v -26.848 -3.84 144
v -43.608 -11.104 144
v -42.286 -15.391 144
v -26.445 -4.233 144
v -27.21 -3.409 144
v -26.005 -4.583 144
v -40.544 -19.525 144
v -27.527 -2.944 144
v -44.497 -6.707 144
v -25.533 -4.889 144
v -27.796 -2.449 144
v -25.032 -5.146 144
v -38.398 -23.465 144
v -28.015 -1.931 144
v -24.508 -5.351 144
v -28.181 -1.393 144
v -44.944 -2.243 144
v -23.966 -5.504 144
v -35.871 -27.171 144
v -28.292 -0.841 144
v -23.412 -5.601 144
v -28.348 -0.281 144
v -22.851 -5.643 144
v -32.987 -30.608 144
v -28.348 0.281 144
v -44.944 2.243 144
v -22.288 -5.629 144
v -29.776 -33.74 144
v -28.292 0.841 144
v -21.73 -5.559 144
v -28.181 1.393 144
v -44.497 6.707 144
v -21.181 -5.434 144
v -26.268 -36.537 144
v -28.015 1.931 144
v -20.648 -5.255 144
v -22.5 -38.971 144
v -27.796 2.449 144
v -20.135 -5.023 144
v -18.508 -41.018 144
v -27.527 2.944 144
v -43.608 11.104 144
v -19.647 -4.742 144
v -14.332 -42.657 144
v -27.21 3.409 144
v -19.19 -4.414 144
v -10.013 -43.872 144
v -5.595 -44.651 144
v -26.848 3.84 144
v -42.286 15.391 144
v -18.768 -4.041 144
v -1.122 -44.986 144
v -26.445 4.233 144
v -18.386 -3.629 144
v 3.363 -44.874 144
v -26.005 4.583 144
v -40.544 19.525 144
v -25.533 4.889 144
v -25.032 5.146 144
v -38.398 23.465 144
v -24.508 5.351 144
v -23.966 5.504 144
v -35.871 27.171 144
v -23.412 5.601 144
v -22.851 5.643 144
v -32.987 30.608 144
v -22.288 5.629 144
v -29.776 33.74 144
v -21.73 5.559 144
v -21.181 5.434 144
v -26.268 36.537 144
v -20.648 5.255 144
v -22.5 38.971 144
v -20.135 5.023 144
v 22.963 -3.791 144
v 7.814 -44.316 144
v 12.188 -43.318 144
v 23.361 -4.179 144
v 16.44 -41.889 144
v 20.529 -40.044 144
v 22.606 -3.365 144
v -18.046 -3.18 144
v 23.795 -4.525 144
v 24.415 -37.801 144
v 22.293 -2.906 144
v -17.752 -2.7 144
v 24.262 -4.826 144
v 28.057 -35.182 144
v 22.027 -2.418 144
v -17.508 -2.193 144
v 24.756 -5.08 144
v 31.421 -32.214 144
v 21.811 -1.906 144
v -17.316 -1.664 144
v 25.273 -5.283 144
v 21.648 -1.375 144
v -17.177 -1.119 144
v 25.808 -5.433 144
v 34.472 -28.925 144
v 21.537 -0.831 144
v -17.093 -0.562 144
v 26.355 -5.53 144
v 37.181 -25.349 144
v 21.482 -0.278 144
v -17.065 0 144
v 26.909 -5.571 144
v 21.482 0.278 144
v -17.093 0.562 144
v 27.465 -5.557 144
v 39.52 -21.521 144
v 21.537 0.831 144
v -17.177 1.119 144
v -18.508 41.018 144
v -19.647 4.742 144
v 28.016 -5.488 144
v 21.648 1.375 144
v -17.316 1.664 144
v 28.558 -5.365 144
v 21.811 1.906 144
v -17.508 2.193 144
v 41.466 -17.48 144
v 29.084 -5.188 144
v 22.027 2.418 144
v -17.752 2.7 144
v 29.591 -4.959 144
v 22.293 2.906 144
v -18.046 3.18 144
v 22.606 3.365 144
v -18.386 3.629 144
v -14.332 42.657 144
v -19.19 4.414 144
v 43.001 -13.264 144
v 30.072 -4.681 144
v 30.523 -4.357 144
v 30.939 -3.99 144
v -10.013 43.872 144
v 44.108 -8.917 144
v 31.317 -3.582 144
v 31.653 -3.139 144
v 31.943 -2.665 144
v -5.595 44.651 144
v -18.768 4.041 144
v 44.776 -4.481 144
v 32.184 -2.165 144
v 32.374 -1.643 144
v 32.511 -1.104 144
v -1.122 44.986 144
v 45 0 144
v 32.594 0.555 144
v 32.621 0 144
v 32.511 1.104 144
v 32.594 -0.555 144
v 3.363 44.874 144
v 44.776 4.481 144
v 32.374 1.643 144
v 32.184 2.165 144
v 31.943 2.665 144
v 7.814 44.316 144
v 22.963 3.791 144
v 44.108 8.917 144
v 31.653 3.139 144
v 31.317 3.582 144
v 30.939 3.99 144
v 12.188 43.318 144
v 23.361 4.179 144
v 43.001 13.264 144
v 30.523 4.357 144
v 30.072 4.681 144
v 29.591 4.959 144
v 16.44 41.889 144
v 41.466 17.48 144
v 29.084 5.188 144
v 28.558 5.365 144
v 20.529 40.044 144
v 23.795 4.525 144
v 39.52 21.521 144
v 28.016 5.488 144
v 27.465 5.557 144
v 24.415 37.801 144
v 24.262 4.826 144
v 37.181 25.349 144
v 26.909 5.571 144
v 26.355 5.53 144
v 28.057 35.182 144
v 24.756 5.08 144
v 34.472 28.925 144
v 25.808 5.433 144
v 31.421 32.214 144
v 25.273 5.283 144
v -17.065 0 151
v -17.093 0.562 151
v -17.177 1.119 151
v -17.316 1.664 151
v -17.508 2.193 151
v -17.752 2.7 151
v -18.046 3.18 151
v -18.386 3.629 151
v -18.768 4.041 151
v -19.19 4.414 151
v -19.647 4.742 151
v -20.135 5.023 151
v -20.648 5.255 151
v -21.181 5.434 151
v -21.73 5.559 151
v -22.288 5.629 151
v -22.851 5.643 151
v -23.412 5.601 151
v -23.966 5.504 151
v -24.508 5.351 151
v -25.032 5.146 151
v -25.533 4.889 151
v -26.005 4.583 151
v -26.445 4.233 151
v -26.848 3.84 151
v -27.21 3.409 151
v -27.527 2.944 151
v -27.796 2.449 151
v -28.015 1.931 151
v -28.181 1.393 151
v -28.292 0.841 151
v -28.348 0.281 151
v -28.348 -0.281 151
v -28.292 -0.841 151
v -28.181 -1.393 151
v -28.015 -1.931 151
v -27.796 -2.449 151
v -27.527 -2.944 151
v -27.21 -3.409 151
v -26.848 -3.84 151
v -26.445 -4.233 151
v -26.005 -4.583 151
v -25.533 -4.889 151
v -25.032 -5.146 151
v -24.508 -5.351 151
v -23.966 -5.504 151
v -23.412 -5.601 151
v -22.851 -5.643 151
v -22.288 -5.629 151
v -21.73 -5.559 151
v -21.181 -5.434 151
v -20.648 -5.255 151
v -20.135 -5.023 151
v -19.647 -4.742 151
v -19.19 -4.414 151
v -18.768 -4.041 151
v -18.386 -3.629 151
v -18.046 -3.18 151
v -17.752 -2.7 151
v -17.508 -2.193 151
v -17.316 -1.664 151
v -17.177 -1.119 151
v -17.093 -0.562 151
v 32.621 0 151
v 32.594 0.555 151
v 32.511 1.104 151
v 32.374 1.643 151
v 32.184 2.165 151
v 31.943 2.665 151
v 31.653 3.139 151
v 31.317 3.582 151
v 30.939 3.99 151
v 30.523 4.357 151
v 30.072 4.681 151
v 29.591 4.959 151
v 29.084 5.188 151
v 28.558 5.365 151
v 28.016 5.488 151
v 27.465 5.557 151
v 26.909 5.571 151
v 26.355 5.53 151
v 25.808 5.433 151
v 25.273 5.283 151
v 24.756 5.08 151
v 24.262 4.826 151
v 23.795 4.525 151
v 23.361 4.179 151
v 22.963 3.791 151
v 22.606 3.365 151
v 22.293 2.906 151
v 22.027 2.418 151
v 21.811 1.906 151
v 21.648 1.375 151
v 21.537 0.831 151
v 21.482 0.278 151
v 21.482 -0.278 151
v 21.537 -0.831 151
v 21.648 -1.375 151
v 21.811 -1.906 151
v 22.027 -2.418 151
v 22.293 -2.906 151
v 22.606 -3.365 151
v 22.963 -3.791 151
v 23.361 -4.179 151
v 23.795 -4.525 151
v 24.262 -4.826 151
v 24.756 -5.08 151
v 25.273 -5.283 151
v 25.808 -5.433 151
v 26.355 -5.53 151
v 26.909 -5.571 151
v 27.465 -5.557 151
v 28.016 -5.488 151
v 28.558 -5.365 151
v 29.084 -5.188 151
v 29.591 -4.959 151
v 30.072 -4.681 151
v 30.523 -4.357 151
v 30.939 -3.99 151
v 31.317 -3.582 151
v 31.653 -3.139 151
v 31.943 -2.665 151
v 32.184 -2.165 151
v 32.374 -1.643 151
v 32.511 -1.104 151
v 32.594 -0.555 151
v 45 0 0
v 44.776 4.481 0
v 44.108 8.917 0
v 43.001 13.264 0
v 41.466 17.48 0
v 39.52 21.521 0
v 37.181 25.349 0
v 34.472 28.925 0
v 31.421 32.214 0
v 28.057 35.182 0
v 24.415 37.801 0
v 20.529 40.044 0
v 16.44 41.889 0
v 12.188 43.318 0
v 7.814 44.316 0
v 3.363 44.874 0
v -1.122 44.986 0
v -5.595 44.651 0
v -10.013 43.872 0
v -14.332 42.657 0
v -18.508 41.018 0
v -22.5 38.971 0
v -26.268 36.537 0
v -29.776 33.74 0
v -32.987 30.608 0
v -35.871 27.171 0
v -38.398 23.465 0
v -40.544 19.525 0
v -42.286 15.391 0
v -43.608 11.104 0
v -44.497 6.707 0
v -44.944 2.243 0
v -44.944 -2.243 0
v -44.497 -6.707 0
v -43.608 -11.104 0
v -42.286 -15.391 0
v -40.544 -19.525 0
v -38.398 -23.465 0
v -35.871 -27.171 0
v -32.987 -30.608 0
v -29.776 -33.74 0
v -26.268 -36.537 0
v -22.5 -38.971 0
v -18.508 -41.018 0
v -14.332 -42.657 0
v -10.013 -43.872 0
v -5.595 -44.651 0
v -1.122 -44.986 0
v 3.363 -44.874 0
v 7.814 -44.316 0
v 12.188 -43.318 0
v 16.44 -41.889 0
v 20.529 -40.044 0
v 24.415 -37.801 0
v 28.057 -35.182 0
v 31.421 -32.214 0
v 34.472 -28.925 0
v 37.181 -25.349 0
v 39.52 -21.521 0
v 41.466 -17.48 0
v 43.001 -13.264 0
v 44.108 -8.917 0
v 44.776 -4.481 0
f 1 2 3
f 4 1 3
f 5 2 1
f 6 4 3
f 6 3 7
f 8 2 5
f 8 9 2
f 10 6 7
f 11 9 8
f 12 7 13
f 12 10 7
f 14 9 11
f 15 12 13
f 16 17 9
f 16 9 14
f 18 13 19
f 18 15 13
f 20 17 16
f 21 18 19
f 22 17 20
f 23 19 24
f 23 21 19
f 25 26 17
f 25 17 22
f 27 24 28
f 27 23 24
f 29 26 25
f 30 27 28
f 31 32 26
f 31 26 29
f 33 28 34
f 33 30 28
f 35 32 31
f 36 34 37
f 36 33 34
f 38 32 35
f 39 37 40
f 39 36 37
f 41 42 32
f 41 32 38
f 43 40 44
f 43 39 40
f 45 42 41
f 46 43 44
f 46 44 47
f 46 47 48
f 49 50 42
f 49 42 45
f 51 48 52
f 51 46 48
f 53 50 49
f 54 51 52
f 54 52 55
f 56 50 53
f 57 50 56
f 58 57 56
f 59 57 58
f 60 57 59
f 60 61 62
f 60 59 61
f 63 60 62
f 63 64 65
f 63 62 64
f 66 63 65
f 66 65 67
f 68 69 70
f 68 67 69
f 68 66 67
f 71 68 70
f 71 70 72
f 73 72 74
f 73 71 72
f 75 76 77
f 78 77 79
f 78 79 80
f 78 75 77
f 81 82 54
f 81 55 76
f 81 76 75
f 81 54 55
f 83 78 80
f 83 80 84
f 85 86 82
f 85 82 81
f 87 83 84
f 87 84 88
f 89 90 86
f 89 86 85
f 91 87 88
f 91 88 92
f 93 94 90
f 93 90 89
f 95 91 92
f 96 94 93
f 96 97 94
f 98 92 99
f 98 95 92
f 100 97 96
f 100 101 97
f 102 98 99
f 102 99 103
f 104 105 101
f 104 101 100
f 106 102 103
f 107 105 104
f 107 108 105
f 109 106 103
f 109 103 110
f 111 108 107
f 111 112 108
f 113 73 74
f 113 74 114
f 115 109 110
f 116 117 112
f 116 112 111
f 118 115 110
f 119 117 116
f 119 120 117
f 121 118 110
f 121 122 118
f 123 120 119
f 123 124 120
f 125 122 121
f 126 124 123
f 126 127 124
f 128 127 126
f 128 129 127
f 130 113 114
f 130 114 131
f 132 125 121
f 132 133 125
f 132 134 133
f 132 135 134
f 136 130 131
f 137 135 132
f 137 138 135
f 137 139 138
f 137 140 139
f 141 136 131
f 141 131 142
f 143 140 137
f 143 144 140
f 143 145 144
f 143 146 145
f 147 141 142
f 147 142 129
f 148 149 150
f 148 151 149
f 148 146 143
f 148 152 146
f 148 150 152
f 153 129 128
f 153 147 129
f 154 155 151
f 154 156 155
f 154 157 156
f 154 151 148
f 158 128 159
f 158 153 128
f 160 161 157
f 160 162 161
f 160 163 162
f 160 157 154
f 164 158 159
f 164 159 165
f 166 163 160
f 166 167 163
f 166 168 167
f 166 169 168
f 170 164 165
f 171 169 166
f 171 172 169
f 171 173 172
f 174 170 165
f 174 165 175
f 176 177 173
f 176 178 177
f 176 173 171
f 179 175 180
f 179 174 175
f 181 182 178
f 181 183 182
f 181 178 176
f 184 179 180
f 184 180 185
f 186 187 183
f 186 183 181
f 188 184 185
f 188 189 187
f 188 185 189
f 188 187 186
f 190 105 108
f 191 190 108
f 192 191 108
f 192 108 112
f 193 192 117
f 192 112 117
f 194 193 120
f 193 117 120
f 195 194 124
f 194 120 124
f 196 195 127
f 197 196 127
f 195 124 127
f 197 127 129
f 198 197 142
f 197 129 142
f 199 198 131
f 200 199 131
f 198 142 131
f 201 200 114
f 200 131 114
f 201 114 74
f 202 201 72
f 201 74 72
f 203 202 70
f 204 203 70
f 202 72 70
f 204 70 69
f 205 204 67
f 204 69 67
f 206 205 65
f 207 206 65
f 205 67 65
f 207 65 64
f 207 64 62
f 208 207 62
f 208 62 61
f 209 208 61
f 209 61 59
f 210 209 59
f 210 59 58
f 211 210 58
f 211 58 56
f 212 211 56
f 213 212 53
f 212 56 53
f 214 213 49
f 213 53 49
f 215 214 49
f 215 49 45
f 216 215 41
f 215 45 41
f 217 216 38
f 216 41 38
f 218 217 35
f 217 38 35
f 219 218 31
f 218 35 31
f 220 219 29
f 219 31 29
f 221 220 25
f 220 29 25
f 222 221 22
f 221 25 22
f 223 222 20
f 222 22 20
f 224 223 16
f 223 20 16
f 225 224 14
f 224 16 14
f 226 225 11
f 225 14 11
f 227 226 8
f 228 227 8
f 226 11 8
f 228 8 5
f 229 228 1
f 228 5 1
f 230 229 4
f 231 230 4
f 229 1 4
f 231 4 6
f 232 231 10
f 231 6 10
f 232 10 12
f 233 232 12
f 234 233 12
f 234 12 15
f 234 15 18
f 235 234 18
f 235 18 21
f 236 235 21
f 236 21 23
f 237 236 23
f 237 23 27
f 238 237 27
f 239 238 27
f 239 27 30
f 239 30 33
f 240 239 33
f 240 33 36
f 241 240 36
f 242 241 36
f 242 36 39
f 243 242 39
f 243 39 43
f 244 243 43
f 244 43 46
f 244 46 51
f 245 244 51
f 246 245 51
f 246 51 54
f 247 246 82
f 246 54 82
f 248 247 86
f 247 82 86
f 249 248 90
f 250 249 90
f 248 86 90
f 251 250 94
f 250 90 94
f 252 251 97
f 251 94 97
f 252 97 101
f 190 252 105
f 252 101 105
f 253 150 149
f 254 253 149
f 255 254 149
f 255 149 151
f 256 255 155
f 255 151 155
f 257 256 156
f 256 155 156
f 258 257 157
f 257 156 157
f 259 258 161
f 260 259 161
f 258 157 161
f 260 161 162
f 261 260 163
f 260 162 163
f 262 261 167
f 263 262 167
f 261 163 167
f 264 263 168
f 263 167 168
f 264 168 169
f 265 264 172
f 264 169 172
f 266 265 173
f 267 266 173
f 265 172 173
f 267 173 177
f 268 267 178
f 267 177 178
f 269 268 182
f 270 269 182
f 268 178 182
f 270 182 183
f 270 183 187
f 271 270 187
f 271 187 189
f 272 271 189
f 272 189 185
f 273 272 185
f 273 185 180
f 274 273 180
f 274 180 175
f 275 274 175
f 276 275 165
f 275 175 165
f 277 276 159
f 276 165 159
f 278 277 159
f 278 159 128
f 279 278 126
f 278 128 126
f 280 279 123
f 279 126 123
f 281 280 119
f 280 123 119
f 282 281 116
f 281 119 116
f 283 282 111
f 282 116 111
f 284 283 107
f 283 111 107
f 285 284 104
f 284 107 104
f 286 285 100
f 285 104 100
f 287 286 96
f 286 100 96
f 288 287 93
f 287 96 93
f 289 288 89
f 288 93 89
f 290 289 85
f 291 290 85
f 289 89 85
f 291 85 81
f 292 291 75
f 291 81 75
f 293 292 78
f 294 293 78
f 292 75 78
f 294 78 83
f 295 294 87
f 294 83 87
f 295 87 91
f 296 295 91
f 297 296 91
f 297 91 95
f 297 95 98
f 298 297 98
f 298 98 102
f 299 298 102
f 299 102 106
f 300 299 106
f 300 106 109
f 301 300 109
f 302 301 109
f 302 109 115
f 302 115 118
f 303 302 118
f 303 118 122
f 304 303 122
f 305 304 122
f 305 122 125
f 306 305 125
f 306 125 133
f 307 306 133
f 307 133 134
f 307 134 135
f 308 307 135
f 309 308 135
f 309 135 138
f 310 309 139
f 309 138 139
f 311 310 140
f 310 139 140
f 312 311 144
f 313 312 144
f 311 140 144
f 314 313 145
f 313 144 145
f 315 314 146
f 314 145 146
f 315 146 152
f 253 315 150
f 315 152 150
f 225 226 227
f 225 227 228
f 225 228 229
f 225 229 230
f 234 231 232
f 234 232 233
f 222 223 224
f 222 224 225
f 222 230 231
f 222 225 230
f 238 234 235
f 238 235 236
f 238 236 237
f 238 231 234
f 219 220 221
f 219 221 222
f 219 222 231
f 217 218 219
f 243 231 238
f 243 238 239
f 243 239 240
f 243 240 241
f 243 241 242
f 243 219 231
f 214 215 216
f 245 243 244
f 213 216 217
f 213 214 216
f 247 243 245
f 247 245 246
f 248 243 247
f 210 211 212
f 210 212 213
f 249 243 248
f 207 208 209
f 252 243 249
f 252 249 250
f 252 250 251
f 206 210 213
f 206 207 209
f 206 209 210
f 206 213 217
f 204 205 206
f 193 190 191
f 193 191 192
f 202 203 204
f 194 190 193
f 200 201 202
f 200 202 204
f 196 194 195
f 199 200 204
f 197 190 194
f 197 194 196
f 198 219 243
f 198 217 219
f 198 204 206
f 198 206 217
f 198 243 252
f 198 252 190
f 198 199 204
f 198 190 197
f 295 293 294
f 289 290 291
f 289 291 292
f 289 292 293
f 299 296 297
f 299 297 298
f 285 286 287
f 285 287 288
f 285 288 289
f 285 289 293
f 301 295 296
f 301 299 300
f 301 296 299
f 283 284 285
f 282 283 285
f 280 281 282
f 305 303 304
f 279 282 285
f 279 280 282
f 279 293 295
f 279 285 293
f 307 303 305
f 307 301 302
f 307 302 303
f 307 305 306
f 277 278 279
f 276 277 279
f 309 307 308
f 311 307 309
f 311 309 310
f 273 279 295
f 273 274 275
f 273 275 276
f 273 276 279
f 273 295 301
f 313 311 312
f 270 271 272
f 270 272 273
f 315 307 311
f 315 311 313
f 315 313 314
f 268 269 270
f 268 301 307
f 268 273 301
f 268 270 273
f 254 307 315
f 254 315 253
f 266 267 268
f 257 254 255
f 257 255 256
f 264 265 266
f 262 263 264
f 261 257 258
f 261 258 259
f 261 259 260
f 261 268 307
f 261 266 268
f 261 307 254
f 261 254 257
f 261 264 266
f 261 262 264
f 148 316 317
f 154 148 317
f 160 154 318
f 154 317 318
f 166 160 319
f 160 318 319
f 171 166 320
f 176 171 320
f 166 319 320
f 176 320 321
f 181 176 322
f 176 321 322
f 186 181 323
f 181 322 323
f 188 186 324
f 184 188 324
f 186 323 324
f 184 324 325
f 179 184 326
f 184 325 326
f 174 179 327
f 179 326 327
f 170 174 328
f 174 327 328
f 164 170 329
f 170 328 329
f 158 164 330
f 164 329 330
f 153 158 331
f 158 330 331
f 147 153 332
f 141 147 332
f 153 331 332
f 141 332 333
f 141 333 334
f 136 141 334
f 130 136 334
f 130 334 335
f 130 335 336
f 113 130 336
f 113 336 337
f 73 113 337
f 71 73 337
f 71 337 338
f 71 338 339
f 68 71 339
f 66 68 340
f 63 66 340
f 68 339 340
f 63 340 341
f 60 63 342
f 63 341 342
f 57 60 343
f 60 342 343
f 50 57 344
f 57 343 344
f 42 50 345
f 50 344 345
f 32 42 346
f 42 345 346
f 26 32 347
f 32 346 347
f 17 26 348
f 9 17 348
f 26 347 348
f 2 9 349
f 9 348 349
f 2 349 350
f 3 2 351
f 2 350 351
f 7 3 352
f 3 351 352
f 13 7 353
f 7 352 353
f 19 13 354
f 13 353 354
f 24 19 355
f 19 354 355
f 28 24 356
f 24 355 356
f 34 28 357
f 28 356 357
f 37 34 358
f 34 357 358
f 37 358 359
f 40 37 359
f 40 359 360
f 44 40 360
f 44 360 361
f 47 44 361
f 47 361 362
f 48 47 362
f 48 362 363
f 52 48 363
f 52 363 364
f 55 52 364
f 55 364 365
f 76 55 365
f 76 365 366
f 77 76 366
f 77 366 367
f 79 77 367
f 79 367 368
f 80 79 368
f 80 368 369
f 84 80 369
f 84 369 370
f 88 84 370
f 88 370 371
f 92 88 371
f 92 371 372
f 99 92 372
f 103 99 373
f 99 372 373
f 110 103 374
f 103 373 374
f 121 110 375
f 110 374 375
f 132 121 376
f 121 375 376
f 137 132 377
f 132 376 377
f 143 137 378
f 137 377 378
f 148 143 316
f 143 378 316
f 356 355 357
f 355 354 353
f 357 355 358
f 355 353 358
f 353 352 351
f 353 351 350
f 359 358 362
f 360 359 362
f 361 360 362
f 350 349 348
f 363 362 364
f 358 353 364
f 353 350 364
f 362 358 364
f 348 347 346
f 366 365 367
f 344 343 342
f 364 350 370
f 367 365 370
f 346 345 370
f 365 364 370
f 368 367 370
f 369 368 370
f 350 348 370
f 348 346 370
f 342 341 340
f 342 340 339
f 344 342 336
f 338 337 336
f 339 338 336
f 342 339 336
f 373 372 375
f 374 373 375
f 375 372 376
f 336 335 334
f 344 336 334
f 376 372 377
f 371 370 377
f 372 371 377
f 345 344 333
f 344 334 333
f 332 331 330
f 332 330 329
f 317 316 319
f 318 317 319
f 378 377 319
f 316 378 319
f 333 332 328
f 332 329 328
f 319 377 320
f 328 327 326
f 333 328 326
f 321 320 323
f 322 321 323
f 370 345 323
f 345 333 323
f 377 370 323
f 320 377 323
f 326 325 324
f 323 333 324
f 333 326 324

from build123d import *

# Parameters (mm, degrees)
SKETCH1_R           = 45
BOSS_EXTRUDE1_DEPTH = 144
SKETCH2_R           = 5.645084992
SKETCH2_R_2         = 5.573002613
BOSS_EXTRUDE2_DEPTH = 7


with BuildPart() as part:
    # Sketch1 → Boss-Extrude1 (new body)
    with BuildSketch(Plane.XY):
        Circle(SKETCH1_R)
    extrude(amount=BOSS_EXTRUDE1_DEPTH)

    # Sketch2 → Boss-Extrude2 (add)
    with BuildSketch(Plane.XY.offset(144)):
        with Locations((-22.710039741, 0)):
            Circle(SKETCH2_R)
        with Locations((27.048206136, 0)):
            Circle(SKETCH2_R_2)
    extrude(amount=BOSS_EXTRUDE2_DEPTH)


solid = part.part
